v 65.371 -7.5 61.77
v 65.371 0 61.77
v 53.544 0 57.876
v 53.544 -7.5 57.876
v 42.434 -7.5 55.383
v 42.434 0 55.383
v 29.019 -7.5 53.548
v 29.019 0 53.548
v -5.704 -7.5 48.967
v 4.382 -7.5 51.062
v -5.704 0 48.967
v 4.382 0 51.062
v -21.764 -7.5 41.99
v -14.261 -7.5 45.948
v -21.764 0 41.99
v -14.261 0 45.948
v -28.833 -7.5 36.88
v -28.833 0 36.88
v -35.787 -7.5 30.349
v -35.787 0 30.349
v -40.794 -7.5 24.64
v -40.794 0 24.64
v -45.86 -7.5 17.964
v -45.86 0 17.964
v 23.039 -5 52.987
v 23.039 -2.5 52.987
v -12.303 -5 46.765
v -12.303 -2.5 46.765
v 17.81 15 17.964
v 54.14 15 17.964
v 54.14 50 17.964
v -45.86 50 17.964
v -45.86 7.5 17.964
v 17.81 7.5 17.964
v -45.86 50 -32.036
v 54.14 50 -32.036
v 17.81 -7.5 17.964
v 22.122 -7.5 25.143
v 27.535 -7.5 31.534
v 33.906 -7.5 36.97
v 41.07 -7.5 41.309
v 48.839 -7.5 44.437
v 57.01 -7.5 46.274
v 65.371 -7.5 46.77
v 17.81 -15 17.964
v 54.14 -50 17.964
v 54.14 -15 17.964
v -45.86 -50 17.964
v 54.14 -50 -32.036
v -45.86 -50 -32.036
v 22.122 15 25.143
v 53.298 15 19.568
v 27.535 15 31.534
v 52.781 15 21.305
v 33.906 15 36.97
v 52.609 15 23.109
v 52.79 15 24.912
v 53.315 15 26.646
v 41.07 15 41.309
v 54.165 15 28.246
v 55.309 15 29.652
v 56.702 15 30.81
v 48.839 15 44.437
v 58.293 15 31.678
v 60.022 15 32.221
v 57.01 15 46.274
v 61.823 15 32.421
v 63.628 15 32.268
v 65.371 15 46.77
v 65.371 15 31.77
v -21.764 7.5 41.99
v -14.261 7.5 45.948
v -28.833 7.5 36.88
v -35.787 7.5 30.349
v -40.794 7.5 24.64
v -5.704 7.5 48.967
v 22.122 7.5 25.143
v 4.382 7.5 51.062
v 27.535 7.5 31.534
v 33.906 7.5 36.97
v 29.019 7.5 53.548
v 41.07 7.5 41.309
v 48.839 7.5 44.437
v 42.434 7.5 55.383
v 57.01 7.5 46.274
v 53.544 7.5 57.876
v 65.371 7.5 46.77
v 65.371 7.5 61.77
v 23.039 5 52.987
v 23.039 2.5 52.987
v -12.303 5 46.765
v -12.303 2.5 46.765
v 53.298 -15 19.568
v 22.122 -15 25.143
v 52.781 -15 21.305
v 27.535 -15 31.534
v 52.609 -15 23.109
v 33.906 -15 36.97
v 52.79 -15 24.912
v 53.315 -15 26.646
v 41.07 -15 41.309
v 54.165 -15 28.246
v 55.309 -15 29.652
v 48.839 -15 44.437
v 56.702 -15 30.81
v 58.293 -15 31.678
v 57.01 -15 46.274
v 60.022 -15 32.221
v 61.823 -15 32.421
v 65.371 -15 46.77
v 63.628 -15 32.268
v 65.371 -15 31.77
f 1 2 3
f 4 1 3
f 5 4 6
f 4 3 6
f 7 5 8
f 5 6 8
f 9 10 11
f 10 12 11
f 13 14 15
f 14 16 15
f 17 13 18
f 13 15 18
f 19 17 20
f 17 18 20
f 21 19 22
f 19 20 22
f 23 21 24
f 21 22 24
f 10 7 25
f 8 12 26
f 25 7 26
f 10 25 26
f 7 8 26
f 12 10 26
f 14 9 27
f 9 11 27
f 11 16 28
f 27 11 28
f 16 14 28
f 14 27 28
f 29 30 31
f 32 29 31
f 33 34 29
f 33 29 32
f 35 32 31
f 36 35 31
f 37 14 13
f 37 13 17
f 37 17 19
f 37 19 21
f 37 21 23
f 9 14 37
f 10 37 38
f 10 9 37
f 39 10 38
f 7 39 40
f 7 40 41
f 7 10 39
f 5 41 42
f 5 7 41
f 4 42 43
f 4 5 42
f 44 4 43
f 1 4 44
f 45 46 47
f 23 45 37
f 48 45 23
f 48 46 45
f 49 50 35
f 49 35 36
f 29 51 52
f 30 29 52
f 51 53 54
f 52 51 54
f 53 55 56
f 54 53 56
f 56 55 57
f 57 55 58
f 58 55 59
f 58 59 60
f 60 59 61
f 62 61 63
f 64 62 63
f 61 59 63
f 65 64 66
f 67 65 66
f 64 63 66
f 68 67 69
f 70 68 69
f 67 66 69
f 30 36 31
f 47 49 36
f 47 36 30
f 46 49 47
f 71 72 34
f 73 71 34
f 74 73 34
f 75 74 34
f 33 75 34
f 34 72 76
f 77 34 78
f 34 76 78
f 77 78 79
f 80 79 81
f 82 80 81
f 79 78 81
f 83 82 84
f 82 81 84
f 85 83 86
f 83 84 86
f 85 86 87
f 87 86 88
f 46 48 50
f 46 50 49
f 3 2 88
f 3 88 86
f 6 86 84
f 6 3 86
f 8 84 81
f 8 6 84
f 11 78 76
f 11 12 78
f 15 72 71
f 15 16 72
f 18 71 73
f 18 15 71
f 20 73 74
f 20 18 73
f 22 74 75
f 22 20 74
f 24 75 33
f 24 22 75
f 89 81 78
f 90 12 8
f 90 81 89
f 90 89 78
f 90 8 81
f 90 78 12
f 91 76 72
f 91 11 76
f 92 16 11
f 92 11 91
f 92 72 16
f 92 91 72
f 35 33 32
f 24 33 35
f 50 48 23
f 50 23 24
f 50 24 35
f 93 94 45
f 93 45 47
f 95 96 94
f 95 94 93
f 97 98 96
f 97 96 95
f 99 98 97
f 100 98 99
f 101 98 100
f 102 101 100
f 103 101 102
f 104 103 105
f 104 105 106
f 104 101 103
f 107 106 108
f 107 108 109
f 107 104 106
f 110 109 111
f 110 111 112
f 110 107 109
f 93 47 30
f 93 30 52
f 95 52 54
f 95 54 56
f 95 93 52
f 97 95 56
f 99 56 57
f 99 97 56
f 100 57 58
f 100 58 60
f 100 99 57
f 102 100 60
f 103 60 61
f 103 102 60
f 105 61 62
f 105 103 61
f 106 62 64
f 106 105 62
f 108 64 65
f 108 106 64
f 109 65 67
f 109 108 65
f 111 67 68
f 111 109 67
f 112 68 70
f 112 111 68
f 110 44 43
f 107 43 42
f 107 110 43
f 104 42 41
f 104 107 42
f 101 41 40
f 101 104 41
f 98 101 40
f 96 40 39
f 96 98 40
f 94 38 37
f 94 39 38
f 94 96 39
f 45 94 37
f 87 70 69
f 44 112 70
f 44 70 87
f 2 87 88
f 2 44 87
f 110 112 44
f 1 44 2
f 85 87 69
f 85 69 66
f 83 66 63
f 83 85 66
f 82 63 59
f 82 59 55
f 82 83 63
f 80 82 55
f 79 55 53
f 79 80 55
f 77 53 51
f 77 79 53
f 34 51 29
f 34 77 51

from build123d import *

# Parameters (mm, degrees)
F1_DEPTH = 50
F2_DEPTH = 15
F3_DEPTH = 7.5


with BuildPart() as f1:
    # F0 (on Front) → F1 (new body, symmetric)
    with BuildSketch(Plane.XZ):
        Polygon((17.809639, 17.96415), (-45.859891, 17.96415), (-45.859891, -32.03585), (54.140109, -32.03585), (54.140109, 17.96415), align=None)
    extrude(amount=F1_DEPTH, both=True)

    # F0 (on Front) → F2 (join, symmetric)
    with BuildSketch(Plane.XZ):
        with BuildLine():
            ThreePointArc((65.37061, 46.769912), (37.400469, 39.284538), (17.809639, 17.96415))
            Line((17.809639, 17.96415), (54.140109, 17.96415))
            ThreePointArc((54.140109, 17.96415), (54.702773, 28.977132), (65.37061, 31.769912))
            Line((65.37061, 31.769912), (65.37061, 46.769912))
        make_face()
    extrude(amount=F2_DEPTH, both=True)

    # F0 (on Front) → F3 (join, symmetric)
    with BuildSketch(Plane.XZ):
        with BuildLine():
            add(Edge.make_bspline(
                [(65.37061, 61.769912), (17.809639, 43.326717), (-11.461159, 66.434294), (-45.859891, 17.96415)],
                knots=[0, 0, 0, 0, 119.545679, 119.545679, 119.545679, 119.545679], degree=3))
            Line((-45.859891, 17.96415), (17.809639, 17.96415))
            ThreePointArc((17.809639, 17.96415), (37.400469, 39.284538), (65.37061, 46.769912))
            Line((65.37061, 46.769912), (65.37061, 61.769912))
        make_face()
    extrude(amount=F3_DEPTH, both=True)


solid = f1.part
